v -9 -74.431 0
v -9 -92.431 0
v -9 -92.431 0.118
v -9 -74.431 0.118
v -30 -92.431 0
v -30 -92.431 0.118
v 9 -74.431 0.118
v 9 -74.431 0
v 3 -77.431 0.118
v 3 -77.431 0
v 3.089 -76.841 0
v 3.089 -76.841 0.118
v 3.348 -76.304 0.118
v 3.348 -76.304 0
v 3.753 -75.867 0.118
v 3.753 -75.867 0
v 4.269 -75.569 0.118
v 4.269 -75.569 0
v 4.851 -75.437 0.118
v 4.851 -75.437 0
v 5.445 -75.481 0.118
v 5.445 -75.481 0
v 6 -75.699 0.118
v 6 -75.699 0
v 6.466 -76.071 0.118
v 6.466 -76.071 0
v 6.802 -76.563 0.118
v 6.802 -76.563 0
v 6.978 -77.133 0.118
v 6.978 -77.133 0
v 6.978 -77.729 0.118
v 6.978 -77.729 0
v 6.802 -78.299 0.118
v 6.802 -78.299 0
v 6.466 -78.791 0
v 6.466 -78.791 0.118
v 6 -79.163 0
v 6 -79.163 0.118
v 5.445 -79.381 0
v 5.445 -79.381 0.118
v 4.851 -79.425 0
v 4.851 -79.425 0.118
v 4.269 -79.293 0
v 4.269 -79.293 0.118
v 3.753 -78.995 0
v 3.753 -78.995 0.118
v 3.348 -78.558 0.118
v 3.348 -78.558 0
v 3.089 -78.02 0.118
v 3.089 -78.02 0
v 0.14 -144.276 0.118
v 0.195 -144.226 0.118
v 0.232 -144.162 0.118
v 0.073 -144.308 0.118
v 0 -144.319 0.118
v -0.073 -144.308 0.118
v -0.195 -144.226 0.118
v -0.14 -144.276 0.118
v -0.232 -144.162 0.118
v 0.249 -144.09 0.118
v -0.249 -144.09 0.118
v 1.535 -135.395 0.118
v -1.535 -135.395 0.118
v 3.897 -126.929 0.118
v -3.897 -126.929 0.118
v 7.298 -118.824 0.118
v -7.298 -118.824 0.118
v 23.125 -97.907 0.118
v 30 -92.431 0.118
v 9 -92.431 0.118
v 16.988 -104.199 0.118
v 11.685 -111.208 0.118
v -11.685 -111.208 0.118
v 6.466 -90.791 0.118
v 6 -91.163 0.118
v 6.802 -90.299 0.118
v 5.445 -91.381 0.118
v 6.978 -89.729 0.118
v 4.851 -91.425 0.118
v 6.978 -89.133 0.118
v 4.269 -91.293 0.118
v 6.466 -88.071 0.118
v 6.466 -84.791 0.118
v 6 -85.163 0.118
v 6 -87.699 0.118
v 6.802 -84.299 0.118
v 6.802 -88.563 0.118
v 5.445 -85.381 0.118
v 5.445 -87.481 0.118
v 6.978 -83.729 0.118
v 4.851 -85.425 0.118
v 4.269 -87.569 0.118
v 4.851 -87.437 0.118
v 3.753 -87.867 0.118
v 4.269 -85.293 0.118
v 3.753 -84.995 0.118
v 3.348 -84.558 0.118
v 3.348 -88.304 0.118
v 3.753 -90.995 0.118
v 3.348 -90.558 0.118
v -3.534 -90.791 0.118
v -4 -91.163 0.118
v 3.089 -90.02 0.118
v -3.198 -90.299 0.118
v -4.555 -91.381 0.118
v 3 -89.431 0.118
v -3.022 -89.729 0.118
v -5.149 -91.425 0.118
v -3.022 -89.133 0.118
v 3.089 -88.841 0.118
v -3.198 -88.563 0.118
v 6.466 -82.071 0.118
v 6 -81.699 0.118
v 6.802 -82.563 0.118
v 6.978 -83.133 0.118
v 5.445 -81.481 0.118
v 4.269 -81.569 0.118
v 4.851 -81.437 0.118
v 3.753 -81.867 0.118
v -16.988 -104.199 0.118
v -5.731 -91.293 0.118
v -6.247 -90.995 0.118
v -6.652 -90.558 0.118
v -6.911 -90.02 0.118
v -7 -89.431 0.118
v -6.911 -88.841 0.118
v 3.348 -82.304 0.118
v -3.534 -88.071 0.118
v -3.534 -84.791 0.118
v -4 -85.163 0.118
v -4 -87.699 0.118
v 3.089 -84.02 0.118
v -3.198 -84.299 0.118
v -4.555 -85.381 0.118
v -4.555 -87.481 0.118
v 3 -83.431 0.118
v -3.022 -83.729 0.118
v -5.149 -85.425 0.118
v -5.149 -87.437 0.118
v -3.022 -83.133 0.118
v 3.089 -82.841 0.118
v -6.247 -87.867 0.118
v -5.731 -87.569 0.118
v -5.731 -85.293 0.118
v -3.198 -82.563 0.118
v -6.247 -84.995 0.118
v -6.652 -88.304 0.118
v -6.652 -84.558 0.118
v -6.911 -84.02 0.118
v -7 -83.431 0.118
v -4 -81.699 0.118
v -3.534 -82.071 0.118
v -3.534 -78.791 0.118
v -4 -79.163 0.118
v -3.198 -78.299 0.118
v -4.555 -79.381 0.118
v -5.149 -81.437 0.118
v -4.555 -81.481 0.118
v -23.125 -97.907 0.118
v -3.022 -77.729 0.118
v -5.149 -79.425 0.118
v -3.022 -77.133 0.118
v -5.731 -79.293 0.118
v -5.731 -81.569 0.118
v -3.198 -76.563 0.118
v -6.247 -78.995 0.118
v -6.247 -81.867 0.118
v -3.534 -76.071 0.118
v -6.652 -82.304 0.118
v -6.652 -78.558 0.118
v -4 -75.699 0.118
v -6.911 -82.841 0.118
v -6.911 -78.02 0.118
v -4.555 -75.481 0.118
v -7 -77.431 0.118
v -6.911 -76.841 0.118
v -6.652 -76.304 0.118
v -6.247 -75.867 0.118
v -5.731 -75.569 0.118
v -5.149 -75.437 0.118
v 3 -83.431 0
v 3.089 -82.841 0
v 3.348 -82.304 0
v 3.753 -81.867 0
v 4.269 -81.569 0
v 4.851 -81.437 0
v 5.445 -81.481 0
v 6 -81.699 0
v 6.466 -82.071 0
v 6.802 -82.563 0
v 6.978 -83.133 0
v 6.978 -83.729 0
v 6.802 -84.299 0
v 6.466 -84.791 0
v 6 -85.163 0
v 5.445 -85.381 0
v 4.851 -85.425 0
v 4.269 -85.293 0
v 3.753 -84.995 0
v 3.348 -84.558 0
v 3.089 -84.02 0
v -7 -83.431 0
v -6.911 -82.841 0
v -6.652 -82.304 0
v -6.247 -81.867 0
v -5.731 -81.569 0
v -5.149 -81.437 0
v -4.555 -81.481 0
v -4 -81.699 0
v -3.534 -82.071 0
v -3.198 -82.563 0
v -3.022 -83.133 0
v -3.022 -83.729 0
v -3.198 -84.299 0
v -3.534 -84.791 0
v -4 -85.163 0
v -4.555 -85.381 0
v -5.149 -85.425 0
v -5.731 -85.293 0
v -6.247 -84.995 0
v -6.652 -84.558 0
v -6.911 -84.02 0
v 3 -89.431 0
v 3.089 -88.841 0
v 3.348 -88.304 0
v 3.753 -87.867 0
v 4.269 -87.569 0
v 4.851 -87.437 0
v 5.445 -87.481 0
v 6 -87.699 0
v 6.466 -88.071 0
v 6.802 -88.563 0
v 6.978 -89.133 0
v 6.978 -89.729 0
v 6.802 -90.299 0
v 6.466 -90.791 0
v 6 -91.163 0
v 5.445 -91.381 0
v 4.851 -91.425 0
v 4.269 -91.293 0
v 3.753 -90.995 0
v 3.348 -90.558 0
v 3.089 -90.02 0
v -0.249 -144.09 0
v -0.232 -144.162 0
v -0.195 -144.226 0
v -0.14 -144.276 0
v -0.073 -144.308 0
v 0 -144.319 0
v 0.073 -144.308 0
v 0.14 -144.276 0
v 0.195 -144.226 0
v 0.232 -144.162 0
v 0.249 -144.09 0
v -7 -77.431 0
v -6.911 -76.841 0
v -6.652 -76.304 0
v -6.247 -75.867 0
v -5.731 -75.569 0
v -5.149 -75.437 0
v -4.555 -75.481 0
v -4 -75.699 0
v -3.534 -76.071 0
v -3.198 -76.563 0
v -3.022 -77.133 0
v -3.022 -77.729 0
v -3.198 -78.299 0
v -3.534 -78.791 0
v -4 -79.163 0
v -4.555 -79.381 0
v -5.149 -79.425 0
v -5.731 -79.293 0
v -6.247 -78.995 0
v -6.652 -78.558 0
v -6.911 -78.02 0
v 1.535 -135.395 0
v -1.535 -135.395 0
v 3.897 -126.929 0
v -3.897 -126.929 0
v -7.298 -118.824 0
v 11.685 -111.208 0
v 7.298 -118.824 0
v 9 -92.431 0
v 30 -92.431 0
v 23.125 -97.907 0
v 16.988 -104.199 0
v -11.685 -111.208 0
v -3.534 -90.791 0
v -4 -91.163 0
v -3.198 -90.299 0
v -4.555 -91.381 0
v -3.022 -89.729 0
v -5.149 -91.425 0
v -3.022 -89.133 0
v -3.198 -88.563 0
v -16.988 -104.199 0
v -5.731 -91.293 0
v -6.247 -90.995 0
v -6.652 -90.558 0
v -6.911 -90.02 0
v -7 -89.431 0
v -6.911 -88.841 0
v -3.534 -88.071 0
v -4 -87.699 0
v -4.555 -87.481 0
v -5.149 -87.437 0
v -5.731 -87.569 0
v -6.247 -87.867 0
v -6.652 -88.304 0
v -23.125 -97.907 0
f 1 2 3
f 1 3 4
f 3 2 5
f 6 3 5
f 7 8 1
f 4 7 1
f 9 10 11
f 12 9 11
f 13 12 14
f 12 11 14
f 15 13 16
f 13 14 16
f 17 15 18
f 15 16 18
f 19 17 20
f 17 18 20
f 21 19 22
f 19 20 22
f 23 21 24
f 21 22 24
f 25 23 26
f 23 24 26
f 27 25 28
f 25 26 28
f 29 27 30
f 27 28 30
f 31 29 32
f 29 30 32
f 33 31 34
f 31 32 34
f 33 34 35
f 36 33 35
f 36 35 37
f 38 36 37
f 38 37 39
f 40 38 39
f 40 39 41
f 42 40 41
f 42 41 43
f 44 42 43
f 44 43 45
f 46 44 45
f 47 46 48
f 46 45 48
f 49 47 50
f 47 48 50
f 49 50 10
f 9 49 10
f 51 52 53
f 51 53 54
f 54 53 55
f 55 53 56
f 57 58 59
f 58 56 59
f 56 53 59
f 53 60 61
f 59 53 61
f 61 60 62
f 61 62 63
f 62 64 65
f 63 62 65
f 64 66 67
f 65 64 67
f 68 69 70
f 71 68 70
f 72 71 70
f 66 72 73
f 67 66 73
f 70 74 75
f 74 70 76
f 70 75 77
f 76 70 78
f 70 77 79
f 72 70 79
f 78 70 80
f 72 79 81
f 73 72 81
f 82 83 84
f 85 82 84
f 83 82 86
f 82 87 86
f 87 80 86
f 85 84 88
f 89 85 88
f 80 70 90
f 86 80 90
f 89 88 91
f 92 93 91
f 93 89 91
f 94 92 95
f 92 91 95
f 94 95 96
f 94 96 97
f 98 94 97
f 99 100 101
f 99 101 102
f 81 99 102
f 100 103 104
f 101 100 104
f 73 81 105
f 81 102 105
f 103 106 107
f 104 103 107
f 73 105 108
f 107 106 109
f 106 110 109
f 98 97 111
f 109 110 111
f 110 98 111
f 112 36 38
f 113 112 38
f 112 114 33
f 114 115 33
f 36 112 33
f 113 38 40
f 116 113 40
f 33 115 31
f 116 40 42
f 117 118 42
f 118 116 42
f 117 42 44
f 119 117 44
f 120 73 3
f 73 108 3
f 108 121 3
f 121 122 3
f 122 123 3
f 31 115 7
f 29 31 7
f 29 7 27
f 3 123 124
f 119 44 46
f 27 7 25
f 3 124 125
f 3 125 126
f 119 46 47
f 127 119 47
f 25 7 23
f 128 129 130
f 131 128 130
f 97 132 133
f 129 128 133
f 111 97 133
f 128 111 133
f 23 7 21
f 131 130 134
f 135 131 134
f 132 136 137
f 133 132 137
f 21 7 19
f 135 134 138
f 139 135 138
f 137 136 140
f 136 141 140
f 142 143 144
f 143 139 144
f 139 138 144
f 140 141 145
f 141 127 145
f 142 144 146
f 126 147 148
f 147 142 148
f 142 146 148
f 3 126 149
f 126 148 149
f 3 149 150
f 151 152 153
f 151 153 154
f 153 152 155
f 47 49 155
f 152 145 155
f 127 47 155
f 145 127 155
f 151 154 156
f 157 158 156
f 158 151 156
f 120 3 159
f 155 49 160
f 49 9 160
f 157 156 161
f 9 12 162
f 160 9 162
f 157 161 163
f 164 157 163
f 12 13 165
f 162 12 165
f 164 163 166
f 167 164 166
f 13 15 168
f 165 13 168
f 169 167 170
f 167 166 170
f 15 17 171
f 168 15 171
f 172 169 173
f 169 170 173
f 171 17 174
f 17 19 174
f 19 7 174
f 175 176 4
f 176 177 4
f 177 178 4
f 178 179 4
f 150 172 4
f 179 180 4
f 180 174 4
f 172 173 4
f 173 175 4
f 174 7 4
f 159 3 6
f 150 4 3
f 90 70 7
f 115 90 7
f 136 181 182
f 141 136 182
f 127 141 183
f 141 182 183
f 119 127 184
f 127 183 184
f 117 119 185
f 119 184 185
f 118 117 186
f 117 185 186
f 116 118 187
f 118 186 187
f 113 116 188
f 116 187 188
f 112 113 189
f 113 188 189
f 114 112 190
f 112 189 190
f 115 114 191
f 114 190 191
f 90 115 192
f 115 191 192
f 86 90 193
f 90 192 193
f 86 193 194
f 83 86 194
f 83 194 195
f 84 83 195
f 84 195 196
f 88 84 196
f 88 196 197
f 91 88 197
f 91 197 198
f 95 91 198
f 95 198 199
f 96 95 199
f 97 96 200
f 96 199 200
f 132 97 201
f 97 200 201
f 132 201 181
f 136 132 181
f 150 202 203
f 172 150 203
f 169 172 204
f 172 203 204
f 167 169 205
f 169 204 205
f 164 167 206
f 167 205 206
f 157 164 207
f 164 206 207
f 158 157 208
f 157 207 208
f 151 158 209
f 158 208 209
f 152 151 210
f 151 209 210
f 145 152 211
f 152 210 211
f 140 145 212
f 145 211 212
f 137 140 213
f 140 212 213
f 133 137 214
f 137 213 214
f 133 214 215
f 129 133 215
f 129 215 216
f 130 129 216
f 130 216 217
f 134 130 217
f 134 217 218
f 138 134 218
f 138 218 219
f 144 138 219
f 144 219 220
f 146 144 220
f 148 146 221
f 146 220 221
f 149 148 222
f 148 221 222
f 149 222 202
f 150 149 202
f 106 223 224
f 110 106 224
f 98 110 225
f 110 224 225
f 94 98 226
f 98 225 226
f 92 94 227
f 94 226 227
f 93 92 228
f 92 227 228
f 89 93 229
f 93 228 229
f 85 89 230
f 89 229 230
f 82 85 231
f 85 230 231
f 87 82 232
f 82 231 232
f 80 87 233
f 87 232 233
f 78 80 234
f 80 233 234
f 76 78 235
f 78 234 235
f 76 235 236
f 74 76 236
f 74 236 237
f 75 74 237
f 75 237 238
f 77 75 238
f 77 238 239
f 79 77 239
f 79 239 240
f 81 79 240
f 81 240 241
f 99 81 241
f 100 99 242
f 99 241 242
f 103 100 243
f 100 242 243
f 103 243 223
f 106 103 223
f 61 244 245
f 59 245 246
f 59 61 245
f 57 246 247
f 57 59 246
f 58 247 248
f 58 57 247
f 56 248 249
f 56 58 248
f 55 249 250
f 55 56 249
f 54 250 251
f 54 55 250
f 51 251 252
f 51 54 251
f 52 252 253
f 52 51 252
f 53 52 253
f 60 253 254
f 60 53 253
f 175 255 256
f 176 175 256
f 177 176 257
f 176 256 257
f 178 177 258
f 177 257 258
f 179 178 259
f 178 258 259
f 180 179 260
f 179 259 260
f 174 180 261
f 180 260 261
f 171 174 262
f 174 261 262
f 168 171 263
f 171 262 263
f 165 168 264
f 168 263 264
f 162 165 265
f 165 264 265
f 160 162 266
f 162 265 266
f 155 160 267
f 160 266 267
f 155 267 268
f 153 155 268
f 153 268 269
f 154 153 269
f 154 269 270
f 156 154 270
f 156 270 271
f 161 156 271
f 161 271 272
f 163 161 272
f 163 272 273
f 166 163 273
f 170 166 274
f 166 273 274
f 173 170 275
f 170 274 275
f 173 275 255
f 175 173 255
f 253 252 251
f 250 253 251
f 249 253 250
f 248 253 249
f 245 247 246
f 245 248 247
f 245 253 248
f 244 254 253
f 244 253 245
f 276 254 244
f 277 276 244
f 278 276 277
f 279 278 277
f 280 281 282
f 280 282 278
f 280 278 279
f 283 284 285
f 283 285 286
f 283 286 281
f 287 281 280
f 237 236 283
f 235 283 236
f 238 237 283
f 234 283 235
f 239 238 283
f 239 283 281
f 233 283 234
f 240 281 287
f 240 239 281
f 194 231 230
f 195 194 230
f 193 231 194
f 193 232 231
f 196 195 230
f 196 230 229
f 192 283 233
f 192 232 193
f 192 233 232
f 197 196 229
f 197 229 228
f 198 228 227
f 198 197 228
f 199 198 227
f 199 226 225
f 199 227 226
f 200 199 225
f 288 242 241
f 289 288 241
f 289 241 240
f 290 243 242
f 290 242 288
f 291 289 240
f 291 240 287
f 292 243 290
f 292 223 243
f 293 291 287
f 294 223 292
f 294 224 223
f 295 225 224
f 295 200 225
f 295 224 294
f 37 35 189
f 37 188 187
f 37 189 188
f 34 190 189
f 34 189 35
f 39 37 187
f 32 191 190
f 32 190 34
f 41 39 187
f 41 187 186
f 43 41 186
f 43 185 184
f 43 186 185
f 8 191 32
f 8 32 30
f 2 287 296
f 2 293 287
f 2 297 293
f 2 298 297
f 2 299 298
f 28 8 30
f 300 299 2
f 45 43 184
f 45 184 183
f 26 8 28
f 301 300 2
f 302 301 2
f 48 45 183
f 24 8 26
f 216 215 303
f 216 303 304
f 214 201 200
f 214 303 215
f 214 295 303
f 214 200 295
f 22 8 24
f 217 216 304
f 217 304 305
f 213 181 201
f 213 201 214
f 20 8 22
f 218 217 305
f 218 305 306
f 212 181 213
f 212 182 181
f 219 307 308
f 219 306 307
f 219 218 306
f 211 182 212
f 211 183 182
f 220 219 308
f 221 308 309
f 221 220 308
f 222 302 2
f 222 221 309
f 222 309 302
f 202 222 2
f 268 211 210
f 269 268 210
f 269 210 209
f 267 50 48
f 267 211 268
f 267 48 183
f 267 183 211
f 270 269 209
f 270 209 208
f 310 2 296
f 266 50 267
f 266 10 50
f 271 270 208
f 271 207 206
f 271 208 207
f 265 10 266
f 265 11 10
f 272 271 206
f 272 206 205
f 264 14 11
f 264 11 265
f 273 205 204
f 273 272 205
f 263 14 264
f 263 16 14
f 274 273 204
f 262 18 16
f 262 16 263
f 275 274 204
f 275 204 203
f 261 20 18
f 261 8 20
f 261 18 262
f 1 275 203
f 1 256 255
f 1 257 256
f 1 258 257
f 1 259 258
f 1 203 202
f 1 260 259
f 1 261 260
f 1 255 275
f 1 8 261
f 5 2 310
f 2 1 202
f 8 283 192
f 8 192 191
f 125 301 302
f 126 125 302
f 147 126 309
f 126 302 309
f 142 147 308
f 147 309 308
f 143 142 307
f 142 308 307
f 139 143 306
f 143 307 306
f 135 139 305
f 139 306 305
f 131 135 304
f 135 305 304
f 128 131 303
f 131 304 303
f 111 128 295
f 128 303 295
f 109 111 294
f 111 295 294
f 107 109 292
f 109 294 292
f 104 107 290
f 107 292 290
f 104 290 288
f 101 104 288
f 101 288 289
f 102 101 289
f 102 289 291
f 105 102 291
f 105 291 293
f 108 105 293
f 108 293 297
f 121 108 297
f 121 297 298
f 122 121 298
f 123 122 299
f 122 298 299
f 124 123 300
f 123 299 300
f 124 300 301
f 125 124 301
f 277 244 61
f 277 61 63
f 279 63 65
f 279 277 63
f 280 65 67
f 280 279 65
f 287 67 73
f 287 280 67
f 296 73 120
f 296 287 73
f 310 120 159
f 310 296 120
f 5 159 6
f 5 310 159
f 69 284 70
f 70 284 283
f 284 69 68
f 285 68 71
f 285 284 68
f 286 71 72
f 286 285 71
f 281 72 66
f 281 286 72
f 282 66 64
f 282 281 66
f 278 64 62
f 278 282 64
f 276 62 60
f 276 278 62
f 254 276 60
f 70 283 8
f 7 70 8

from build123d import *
from OCP.BRepFilletAPI import BRepFilletAPI_MakeChamfer

# Parameters (mm, degrees)
SKETCH2_R           = 1.5875
BOSS_EXTRUDE1_DEPTH = 0.118
SKETCH3_R           = 2
CUT_EXTRUDE1_DEPTH  = 267.27056526
CHAMFER1_SIZE       = 20
CHAMFER1_SIZE2      = 24.415491775
SKETCH4_W           = 440.908945527
SKETCH4_H           = 173.352966469
CUT_EXTRUDE4_DEPTH  = 251.000027848
SKETCH5_W           = 18
SKETCH5_H           = 18
SKETCH5_R           = 2
BOSS_EXTRUDE2_DEPTH = 0.118
FILLET1_R           = 0.25


with BuildPart() as part:
    # Sketch2 → Boss-Extrude1 (new body)
    with BuildSketch(Plane.XY):
        with BuildLine():
            Line((99.563224144, -21.926473835), (48.69, -83.15))
            ThreePointArc((48.69, -83.15), (13.462751156, -108.648946204), (0, -150))
            ThreePointArc((0, -150), (-13.462751156, -108.648946204), (-48.69, -83.15))
            Line((-48.69, -83.15), (-99.563224144, -21.926473835))
            Line((-99.563224144, -21.926473835), (-140, -21.926473835))
            ThreePointArc((-140, -21.926473835), (-145.965681261, -3.736597624), (-158.952536164, 10.327631798))
            Line((-158.952536164, 10.327631798), (-220, 53.073526165))
            Line((-220, 53.073526165), (-67, 53.073526165))
            ThreePointArc((-67, 53.073526165), (-51.137889855, 23.094319589), (-17.95554779, 16.073526165))
            Line((-17.95554779, 16.073526165), (-15.117733438, 43.073526165))
            Line((-15.117733438, 43.073526165), (-12, 30.568980335))
            ThreePointArc((-12, 30.568980335), (0, 33.073526165), (12, 30.568980335))
            Line((12, 30.568980335), (15.117733438, 43.073526165))
            Line((15.117733438, 43.073526165), (17.95554779, 16.073526165))
            ThreePointArc((17.95554779, 16.073526165), (51.137889855, 23.094319589), (67, 53.073526165))
            Line((67, 53.073526165), (220, 53.073526165))
            Line((220, 53.073526165), (158.952536164, 10.327631798))
            ThreePointArc((158.952536164, 10.327631798), (145.965681261, -3.736597624), (140, -21.926473835))
            Line((140, -21.926473835), (99.563224144, -21.926473835))
        make_face()
        with Locations((46.19, 13)):
            Circle(SKETCH2_R, mode=Mode.SUBTRACT)
        with Locations((-46.19, 13)):
            Circle(SKETCH2_R, mode=Mode.SUBTRACT)
        with Locations((46.19, -80.65)):
            Circle(SKETCH2_R, mode=Mode.SUBTRACT)
        with Locations((-46.19, -80.65)):
            Circle(SKETCH2_R, mode=Mode.SUBTRACT)
    extrude(amount=BOSS_EXTRUDE1_DEPTH)

    # Sketch3 → Cut-Extrude1 (cut, through all)
    with BuildSketch(Plane(origin=(0, 0, 0), x_dir=(-1, 0, 0), z_dir=(0, 0, -1))):
        with Locations((165, 49.573526165)):
            Circle(SKETCH3_R)
        with Locations((165, 19.573526165)):
            Circle(SKETCH3_R)
        with Locations((150, 34.573526165)):
            Circle(SKETCH3_R)
    cut_extrude1 = extrude(amount=-CUT_EXTRUDE1_DEPTH, mode=Mode.SUBTRACT)

    # Mirror2: Cut-Extrude1 across plane
    add(cut_extrude1.mirror(Plane(origin=(0, 0, 0), x_dir=(0, 0, 1), z_dir=(1, 0, 0))), mode=Mode.SUBTRACT)

    # Chamfer1: one chamfer whose edges measure the first distance from different faces: ONE call of the kernel's chamfer builder (chamfer() names one face for all edges)
    chamfer1_edges_1 = [part.edges().sort_by_distance(p)[0] for p in [
        (220, 53.073526165, 0.059),
    ]]
    chamfer1_side_1 = [part.faces().sort_by_distance(p)[0] for p in [
        (143.5, 53.073526165, 0.059),
    ]]
    chamfer1_edges_2 = [part.edges().sort_by_distance(p)[0] for p in [
        (-220, 53.073526165, 0.059),
    ]]
    chamfer1_side_2 = [part.faces().sort_by_distance(p)[0] for p in [
        (-143.5, 53.073526165, 0.059),
    ]]
    chamfer1 = BRepFilletAPI_MakeChamfer(part.part.solid().wrapped)
    for e in chamfer1_edges_1:
        chamfer1.Add(CHAMFER1_SIZE, CHAMFER1_SIZE2, e.wrapped, chamfer1_side_1[0].wrapped)  # the first distance lies on this face
    for e in chamfer1_edges_2:
        chamfer1.Add(CHAMFER1_SIZE, CHAMFER1_SIZE2, e.wrapped, chamfer1_side_2[0].wrapped)  # the first distance lies on this face
    add(Compound.cast(chamfer1.Shape()), mode=Mode.REPLACE)

    # Sketch4 → Cut-Extrude4 (cut, through all)
    with BuildSketch(Plane(origin=(0, 0, 0), x_dir=(-1, 0, 0), z_dir=(0, 0, -1))):
        with Locations((-5.514300507, -5.754470648)):
            Rectangle(SKETCH4_W, SKETCH4_H)
    extrude(amount=-CUT_EXTRUDE4_DEPTH, mode=Mode.SUBTRACT)

    # Sketch5 → Boss-Extrude2 (add)
    with BuildSketch(Plane(origin=(0, 0, 0), x_dir=(-1, 0, 0), z_dir=(0, 0, -1))):
        with Locations((0, -83.430953883)):
            Rectangle(SKETCH5_W, SKETCH5_H)
        with Locations((-5, -89.430953883)):
            Circle(SKETCH5_R, mode=Mode.SUBTRACT)
        with Locations((5, -89.430953883)):
            Circle(SKETCH5_R, mode=Mode.SUBTRACT)
        with Locations((-5, -83.430953883)):
            Circle(SKETCH5_R, mode=Mode.SUBTRACT)
        with Locations((5, -83.430953883)):
            Circle(SKETCH5_R, mode=Mode.SUBTRACT)
        with Locations((-5, -77.430953883)):
            Circle(SKETCH5_R, mode=Mode.SUBTRACT)
        with Locations((5, -77.430953883)):
            Circle(SKETCH5_R, mode=Mode.SUBTRACT)
    extrude(amount=-BOSS_EXTRUDE2_DEPTH)

    # Fillet1
    fillet1_edges = [part.edges().sort_by_distance(p)[0] for p in [
        (0, -150, 0.059),
    ]]
    fillet(fillet1_edges, radius=FILLET1_R)


solid = part.part
